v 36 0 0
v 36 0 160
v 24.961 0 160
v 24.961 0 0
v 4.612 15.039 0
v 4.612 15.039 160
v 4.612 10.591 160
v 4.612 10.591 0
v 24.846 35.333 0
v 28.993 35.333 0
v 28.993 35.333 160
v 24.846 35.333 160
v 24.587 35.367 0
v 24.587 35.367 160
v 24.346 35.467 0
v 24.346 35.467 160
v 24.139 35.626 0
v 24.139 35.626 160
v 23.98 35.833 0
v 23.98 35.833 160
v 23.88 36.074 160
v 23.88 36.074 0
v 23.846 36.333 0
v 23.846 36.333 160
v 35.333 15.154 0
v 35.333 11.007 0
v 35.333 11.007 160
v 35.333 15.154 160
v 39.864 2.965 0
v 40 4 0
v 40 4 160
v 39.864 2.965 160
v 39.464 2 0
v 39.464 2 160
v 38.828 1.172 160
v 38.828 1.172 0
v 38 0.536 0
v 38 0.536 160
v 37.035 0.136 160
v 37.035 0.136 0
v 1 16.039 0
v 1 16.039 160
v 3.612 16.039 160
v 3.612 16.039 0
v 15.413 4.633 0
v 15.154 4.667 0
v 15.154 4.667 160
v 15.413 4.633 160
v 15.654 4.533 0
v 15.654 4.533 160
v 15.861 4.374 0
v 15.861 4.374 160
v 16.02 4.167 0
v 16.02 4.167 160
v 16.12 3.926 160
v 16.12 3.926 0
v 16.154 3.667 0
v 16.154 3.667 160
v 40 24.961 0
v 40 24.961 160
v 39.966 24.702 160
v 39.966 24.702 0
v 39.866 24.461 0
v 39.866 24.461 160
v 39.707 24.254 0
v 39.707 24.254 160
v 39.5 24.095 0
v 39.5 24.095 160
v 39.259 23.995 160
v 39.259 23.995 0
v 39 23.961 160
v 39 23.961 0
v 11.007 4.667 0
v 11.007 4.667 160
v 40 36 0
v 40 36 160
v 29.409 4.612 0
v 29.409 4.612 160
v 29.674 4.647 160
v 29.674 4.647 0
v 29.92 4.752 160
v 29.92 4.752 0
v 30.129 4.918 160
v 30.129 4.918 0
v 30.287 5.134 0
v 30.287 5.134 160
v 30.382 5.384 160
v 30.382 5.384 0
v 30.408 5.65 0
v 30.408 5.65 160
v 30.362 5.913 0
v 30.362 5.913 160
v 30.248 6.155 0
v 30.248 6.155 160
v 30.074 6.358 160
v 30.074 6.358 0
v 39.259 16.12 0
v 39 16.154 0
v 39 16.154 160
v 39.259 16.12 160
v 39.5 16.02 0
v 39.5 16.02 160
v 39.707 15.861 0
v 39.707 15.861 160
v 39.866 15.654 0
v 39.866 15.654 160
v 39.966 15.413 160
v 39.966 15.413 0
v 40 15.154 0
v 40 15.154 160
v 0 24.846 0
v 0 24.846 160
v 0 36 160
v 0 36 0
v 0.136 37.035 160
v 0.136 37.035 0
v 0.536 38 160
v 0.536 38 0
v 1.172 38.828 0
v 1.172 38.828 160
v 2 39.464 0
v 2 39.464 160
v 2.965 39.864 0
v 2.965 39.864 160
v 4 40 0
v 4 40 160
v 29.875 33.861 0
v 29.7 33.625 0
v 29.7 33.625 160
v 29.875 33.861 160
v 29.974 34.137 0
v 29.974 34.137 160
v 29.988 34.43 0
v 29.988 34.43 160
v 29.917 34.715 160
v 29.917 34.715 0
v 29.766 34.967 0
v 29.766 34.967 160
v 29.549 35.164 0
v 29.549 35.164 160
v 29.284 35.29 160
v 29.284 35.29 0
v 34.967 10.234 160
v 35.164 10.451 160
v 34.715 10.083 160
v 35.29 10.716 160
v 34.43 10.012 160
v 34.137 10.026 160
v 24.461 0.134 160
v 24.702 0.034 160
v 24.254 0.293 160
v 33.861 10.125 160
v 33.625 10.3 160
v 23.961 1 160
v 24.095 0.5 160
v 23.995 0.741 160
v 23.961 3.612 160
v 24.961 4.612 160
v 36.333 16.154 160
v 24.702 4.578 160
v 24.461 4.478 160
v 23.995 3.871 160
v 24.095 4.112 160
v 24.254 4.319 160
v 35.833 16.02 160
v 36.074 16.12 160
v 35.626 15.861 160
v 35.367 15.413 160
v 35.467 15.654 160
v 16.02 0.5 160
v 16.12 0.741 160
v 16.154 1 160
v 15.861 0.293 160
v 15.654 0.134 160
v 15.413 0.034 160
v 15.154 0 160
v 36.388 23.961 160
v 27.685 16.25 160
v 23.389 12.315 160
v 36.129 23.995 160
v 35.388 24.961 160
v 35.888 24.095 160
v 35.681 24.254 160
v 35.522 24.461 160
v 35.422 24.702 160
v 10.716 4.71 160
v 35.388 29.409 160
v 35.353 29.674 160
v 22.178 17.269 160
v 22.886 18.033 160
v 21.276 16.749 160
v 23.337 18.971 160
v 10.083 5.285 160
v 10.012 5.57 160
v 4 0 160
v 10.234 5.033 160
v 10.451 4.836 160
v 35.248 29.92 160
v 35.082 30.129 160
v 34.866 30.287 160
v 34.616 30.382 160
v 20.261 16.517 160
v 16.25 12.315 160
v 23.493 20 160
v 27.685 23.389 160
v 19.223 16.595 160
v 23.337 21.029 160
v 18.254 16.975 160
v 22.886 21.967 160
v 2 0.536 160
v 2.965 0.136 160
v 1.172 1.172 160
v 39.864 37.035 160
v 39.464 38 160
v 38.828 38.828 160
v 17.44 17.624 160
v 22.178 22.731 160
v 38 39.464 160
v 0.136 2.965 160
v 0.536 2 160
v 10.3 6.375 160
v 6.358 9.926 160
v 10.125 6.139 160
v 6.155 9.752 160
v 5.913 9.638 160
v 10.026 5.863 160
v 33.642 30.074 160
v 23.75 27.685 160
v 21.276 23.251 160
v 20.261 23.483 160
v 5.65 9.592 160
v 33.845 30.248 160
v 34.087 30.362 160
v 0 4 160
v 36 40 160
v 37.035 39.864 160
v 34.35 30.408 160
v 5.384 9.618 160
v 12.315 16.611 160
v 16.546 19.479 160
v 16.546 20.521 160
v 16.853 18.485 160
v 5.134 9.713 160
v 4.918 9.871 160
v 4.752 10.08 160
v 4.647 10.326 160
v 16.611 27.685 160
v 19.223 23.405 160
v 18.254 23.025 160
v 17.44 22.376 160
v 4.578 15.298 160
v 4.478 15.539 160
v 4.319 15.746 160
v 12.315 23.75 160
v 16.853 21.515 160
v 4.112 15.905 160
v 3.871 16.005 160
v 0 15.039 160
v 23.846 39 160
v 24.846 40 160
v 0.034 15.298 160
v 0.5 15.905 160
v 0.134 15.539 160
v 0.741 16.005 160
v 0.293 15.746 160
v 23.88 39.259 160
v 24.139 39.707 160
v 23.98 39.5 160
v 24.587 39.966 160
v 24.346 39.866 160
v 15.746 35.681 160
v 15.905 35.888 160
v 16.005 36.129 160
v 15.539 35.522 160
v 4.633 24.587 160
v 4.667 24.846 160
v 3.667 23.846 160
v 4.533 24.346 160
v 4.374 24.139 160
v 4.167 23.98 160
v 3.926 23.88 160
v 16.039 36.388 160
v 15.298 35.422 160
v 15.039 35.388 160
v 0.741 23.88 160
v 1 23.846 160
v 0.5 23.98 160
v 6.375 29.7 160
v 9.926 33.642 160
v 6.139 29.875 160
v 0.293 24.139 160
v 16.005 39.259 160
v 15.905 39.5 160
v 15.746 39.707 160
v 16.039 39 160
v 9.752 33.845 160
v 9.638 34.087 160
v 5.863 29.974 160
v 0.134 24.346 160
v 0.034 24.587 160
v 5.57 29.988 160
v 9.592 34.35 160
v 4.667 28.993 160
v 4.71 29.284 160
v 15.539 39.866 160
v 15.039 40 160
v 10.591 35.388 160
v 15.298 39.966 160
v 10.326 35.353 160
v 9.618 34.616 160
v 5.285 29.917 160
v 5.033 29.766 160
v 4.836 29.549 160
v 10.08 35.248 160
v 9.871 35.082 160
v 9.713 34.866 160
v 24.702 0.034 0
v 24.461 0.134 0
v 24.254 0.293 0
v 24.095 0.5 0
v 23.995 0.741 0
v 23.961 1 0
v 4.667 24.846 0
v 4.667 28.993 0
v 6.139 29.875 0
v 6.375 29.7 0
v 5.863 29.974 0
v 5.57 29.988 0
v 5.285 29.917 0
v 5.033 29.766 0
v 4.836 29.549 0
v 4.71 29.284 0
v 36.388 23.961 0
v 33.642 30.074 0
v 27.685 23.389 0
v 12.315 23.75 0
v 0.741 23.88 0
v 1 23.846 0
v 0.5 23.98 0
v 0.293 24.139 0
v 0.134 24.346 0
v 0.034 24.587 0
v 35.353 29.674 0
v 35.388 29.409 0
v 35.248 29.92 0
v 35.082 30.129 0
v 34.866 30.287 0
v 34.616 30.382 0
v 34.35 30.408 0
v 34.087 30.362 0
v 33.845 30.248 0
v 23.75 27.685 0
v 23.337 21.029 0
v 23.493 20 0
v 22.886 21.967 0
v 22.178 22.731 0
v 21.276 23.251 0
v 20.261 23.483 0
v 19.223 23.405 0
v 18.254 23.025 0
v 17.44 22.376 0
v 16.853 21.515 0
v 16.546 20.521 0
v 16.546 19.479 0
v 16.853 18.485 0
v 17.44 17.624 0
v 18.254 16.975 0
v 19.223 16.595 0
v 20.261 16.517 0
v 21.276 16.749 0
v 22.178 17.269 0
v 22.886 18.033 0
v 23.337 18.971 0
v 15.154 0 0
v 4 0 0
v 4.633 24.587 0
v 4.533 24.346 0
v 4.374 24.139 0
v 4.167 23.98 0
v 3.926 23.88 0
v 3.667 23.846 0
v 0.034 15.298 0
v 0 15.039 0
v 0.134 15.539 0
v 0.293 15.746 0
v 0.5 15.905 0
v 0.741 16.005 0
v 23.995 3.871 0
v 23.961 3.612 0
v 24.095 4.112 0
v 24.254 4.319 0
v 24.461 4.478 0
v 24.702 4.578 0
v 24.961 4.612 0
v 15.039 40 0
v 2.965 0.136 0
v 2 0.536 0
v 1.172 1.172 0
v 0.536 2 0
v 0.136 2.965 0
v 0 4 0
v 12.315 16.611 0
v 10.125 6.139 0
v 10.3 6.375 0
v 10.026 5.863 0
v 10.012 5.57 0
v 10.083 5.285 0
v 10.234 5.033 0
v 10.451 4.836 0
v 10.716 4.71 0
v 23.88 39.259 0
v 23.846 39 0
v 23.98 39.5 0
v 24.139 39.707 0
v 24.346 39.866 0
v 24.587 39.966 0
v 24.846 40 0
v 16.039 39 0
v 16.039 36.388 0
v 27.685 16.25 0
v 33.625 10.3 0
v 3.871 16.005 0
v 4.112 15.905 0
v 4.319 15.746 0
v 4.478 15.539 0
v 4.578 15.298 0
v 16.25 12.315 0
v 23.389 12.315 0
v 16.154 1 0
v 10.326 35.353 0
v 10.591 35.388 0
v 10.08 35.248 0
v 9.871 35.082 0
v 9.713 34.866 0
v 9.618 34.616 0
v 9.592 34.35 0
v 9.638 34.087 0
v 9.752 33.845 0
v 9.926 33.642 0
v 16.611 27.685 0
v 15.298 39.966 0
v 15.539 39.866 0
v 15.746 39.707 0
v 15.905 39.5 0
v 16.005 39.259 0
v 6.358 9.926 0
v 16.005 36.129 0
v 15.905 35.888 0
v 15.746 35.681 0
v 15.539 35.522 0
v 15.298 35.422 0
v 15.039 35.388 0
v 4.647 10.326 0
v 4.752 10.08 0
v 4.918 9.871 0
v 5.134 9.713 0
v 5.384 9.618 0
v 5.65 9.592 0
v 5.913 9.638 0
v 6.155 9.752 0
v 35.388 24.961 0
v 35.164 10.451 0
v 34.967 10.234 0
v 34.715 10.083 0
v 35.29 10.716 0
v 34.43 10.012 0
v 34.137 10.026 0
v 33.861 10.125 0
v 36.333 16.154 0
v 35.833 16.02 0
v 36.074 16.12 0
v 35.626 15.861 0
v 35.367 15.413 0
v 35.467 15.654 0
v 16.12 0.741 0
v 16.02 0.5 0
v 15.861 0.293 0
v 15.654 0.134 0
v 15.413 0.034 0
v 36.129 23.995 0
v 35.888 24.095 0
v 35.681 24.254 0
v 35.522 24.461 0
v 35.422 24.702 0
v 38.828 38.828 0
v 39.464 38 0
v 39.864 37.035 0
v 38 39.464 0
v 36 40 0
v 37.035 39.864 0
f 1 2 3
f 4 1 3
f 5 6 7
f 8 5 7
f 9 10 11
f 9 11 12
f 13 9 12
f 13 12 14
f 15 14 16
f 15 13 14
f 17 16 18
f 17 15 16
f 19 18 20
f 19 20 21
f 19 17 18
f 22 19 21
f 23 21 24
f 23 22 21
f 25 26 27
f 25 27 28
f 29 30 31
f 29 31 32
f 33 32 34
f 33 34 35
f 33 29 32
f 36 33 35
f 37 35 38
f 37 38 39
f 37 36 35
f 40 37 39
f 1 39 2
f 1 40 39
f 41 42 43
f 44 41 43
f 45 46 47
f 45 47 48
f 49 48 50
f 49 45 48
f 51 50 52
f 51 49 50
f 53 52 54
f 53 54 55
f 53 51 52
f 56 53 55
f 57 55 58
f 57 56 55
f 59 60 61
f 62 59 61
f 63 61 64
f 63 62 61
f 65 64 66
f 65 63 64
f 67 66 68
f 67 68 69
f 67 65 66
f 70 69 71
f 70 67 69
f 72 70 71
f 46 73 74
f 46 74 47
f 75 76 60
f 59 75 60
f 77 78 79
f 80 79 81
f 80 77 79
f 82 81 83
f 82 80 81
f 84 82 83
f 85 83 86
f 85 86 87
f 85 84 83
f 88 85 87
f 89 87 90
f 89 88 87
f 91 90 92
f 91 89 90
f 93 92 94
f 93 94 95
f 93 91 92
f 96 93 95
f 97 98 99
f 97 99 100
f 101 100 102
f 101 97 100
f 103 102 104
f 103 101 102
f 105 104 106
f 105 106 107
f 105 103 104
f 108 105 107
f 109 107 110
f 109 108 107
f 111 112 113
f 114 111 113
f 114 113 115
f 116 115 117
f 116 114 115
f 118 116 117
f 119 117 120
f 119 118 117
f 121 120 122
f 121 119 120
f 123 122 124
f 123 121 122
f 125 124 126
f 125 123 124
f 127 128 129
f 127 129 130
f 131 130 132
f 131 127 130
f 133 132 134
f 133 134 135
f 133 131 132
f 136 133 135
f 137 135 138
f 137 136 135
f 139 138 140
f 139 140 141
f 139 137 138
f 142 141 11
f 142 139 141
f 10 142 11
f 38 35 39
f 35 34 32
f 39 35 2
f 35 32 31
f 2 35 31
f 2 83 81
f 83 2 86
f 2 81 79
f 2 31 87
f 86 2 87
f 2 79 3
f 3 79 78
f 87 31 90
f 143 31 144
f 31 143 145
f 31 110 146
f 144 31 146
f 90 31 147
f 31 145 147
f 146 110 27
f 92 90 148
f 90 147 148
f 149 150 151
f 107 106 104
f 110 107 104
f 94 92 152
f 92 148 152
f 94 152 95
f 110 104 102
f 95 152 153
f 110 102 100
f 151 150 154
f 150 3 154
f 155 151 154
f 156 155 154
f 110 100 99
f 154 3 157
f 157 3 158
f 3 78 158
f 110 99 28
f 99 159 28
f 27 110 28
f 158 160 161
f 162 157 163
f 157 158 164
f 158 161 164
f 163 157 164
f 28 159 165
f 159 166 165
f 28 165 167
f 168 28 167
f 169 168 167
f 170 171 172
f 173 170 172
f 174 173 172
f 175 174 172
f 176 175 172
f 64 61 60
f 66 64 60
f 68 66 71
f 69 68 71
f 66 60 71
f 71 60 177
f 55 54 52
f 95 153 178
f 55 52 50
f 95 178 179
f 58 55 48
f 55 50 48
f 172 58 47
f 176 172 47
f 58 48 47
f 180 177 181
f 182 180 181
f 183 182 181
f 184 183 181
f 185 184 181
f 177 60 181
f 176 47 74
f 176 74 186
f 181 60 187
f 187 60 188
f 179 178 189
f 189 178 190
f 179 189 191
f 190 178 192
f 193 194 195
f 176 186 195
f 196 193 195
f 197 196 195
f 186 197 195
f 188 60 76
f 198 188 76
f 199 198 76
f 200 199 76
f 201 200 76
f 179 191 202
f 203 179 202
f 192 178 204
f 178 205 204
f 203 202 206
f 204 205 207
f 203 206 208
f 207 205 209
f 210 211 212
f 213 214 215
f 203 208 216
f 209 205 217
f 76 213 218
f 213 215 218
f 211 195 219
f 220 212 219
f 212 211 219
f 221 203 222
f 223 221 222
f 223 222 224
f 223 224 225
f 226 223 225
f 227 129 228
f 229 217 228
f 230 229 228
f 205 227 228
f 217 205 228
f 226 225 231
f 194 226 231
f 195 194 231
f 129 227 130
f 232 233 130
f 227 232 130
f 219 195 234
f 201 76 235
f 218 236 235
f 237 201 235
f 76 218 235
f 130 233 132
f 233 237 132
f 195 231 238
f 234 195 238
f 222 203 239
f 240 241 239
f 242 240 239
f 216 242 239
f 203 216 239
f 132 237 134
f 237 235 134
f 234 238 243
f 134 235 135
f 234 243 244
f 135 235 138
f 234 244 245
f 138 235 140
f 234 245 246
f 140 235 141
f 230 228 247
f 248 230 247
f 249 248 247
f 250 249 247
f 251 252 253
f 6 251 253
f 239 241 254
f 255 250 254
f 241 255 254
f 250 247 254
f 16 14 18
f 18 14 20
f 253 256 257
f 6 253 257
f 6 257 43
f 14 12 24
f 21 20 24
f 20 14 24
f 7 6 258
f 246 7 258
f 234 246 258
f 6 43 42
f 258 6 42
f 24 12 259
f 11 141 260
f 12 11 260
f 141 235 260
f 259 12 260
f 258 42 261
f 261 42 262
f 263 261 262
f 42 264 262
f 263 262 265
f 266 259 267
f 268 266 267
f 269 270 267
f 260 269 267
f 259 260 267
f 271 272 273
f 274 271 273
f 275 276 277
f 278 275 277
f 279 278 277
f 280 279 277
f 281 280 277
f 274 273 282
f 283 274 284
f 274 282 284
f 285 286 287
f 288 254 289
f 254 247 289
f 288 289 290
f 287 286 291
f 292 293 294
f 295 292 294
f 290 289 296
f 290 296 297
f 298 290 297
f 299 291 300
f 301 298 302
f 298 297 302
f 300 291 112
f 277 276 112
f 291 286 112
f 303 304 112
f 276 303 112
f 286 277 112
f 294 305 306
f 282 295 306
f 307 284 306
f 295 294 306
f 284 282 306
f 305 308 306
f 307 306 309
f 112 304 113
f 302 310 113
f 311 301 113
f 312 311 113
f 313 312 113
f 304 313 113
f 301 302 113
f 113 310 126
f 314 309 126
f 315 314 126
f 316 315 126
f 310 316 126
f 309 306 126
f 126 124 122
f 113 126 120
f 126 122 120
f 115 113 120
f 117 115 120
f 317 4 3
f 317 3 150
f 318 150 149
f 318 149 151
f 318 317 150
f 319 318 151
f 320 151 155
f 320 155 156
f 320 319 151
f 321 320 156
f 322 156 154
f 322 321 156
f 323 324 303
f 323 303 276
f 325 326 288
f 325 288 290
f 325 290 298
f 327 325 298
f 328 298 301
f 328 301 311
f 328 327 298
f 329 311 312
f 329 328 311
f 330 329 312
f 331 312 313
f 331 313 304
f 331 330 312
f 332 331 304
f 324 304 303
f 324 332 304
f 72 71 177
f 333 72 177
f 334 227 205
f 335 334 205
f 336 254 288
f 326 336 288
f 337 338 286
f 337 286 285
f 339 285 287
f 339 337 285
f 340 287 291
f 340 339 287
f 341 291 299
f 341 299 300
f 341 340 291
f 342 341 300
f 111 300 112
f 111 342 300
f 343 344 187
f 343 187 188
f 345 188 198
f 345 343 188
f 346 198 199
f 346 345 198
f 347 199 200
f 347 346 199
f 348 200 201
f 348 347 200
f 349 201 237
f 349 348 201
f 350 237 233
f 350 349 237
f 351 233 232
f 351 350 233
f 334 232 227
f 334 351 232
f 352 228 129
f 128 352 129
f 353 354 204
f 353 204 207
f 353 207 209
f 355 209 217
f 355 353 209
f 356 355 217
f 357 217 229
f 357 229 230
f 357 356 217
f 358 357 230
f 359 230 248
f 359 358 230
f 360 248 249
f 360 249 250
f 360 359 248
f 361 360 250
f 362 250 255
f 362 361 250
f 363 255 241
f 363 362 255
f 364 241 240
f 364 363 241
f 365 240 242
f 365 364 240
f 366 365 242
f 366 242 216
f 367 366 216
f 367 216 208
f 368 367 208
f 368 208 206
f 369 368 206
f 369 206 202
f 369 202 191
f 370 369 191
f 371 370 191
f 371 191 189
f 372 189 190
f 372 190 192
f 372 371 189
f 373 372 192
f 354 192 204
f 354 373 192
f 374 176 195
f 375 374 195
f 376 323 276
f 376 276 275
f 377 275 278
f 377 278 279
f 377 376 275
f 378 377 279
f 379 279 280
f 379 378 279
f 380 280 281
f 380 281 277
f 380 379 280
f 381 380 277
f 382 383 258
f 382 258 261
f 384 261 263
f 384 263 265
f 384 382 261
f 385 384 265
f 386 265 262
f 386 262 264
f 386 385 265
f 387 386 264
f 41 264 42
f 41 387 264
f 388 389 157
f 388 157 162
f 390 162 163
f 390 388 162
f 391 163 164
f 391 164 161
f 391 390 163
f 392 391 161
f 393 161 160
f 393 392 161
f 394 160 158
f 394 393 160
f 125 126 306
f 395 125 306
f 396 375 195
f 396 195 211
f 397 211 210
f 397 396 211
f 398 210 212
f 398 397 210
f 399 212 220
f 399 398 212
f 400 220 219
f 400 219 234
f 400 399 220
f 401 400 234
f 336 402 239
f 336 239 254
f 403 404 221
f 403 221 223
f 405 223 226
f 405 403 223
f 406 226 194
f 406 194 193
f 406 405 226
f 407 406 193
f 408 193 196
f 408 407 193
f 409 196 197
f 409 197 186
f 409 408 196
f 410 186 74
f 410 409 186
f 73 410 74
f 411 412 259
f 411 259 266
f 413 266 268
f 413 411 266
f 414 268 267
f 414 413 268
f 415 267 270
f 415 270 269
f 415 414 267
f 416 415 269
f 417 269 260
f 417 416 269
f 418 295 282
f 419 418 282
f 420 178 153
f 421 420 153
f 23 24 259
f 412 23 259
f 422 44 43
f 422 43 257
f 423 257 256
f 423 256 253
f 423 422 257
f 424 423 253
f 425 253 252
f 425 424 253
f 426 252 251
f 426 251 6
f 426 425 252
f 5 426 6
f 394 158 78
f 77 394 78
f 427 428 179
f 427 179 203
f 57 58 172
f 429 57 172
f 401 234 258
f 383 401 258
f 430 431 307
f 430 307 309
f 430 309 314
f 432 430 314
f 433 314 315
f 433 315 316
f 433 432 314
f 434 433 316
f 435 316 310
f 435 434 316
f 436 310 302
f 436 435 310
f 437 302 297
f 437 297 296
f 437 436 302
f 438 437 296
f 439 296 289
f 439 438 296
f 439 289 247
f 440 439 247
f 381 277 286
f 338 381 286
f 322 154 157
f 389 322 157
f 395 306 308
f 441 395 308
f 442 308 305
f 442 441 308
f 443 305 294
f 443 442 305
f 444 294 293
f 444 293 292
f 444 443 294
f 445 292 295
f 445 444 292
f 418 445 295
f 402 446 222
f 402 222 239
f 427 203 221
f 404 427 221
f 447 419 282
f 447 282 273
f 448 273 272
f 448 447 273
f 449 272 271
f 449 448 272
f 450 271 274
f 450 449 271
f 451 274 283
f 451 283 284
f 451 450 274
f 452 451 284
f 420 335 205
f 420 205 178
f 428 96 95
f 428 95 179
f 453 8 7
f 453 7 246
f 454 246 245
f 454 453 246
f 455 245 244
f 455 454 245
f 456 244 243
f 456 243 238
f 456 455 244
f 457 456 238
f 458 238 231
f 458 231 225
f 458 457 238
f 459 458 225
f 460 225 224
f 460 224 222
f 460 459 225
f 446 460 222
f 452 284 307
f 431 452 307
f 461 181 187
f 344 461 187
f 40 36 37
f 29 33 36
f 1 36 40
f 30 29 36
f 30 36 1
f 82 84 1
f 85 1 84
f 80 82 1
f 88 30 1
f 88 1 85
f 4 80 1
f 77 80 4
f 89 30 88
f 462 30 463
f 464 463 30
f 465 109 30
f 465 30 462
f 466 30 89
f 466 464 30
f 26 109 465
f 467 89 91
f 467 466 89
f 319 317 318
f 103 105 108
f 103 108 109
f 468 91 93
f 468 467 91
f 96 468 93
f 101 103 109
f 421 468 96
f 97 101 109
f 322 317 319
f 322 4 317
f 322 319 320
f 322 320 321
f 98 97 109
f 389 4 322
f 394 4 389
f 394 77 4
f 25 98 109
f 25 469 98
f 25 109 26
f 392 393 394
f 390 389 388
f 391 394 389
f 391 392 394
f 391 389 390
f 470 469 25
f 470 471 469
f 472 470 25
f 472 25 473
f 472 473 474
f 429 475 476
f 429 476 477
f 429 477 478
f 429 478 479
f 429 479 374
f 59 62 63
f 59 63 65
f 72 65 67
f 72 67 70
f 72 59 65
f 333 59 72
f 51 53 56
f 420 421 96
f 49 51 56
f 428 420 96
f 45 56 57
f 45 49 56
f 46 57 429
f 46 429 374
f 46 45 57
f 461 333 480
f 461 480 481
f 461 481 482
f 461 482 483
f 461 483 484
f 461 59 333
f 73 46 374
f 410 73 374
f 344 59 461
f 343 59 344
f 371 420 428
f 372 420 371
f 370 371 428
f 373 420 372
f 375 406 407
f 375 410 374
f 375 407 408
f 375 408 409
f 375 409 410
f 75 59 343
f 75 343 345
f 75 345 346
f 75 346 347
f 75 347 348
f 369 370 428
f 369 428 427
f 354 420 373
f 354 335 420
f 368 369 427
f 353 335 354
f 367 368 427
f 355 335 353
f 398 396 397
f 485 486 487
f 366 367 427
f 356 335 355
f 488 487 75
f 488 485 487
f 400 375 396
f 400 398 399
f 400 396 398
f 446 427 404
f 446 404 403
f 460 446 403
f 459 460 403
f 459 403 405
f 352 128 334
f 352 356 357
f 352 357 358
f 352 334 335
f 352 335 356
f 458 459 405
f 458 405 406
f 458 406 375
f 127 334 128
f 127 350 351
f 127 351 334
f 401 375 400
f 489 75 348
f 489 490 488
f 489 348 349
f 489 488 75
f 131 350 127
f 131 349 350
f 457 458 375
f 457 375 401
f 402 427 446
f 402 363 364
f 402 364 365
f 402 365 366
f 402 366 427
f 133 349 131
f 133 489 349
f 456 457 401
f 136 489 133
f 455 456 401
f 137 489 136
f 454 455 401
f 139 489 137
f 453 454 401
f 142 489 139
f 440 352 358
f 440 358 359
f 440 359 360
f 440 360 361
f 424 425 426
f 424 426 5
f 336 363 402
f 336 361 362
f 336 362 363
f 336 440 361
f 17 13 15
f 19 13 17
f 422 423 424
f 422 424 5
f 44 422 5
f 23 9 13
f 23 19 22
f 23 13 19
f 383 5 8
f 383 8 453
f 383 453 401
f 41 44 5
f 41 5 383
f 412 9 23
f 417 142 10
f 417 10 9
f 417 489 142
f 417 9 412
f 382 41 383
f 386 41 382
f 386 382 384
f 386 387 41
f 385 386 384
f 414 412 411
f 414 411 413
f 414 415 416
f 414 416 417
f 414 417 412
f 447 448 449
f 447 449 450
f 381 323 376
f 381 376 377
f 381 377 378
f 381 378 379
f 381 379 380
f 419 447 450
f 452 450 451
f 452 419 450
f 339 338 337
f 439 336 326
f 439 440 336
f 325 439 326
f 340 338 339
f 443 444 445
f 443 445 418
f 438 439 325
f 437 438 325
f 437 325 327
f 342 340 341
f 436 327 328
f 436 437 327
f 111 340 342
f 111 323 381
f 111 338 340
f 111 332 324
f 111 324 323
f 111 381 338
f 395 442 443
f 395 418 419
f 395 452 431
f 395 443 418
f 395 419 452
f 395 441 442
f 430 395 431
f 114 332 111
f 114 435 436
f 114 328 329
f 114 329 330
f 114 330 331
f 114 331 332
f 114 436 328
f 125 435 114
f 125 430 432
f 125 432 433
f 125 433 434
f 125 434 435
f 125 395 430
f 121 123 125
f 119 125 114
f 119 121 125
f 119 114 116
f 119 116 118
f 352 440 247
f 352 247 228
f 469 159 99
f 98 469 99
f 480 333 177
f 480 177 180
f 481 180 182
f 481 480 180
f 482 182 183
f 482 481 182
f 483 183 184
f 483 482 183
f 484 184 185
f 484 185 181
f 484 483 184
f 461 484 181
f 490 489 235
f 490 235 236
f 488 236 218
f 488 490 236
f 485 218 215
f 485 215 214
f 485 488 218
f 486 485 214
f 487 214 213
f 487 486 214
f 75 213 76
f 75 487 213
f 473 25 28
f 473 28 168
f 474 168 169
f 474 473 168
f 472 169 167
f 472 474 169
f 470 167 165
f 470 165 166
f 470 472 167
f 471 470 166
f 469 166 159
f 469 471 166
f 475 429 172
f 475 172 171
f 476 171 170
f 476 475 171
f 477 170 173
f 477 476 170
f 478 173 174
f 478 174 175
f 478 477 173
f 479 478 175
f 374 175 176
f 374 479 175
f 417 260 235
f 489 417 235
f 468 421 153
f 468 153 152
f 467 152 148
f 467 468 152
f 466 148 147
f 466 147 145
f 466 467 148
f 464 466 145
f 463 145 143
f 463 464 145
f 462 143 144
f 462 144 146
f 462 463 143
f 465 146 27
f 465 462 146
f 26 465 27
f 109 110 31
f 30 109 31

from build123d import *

# Parameters (mm, degrees)
SKETCH2_R           = 3.492543695
BOSS_EXTRUDE1_DEPTH = 160


with BuildPart() as part:
    # Sketch2 → Boss-Extrude1 (new body)
    with BuildSketch(Plane.XY):
        with BuildLine():
            Line((19.48831917, 27.684671829), (23.749889801, 27.684671829))
            Line((23.749889801, 27.684671829), (29.699681879, 33.624984685))
            ThreePointArc((29.699681879, 33.624984685), (29.917171057, 34.714970099), (28.993139054, 35.332654972))
            Line((28.993139054, 35.332654972), (24.845630957, 35.332654972))
            ThreePointArc((24.845630957, 35.332654972), (24.138524175, 35.625548191), (23.845630957, 36.332654972))
            Line((23.845630957, 36.332654972), (23.845630957, 39))
            ThreePointArc((23.845630957, 39), (24.138524175, 39.707106781), (24.845630957, 40))
            Line((24.845630957, 40), (36, 40))
            ThreePointArc((36, 40), (38.828427125, 38.828427125), (40, 36))
            Line((40, 36), (40, 24.961087436))
            ThreePointArc((40, 24.961087436), (39.707106781, 24.253980655), (39, 23.961087436))
            Line((39, 23.961087436), (36.388269628, 23.961087436))
            ThreePointArc((36.388269628, 23.961087436), (35.681162846, 24.253980655), (35.388269628, 24.961087436))
            Line((35.388269628, 24.961087436), (35.388269628, 29.408620307))
            ThreePointArc((35.388269628, 29.408620307), (34.744223919, 30.343123673), (33.641676542, 30.073901274))
            Line((33.641676542, 30.073901274), (27.684671829, 23.388818206))
            Line((27.684671829, 23.388818206), (27.684671829, 20.51168083))
            Line((27.684671829, 20.51168083), (27.684671829, 16.250110199))
            Line((27.684671829, 16.250110199), (33.624984685, 10.300318121))
            ThreePointArc((33.624984685, 10.300318121), (34.714970099, 10.082828943), (35.332654972, 11.006860946))
            Line((35.332654972, 11.006860946), (35.332654972, 15.154369043))
            ThreePointArc((35.332654972, 15.154369043), (35.625548191, 15.861475825), (36.332654972, 16.154369043))
            Line((36.332654972, 16.154369043), (39, 16.154369043))
            ThreePointArc((39, 16.154369043), (39.707106781, 15.861475825), (40, 15.154369043))
            Line((40, 15.154369043), (40, 4))
            ThreePointArc((40, 4), (38.828427125, 1.171572875), (36, 0))
            Line((36, 0), (24.961087436, 0))
            ThreePointArc((24.961087436, 0), (24.253980655, 0.292893219), (23.961087436, 1))
            Line((23.961087436, 1), (23.961087436, 3.611730372))
            ThreePointArc((23.961087436, 3.611730372), (24.253980655, 4.318837154), (24.961087436, 4.611730372))
            Line((24.961087436, 4.611730372), (29.408620307, 4.611730372))
            ThreePointArc((29.408620307, 4.611730372), (30.343123673, 5.255776081), (30.073901274, 6.358323458))
            Line((30.073901274, 6.358323458), (23.388818206, 12.315328171))
            Line((23.388818206, 12.315328171), (20.51168083, 12.315328171))
            Line((20.51168083, 12.315328171), (16.250110199, 12.315328171))
            Line((16.250110199, 12.315328171), (10.300318121, 6.375015315))
            ThreePointArc((10.300318121, 6.375015315), (10.082828943, 5.285029901), (11.006860946, 4.667345028))
            Line((11.006860946, 4.667345028), (15.154369043, 4.667345028))
            ThreePointArc((15.154369043, 4.667345028), (15.861475825, 4.374451809), (16.154369043, 3.667345028))
            Line((16.154369043, 3.667345028), (16.154369043, 1))
            ThreePointArc((16.154369043, 1), (15.861475825, 0.292893219), (15.154369043, 0))
            Line((15.154369043, 0), (4, 0))
            ThreePointArc((4, 0), (1.171572875, 1.171572875), (0, 4))
            Line((0, 4), (0, 15.038912564))
            ThreePointArc((0, 15.038912564), (0.292893219, 15.746019345), (1, 16.038912564))
            Line((1, 16.038912564), (3.611730372, 16.038912564))
            ThreePointArc((3.611730372, 16.038912564), (4.318837154, 15.746019345), (4.611730372, 15.038912564))
            Line((4.611730372, 15.038912564), (4.611730372, 10.591379693))
            ThreePointArc((4.611730372, 10.591379693), (5.255776081, 9.656876327), (6.358323458, 9.926098726))
            Line((6.358323458, 9.926098726), (12.315328171, 16.611181794))
            Line((12.315328171, 16.611181794), (12.315328171, 19.48831917))
            Line((12.315328171, 19.48831917), (12.315328171, 23.749889801))
            Line((12.315328171, 23.749889801), (6.375015315, 29.699681879))
            ThreePointArc((6.375015315, 29.699681879), (5.285029901, 29.917171057), (4.667345028, 28.993139054))
            Line((4.667345028, 28.993139054), (4.667345028, 24.845630957))
            ThreePointArc((4.667345028, 24.845630957), (4.374451809, 24.138524175), (3.667345028, 23.845630957))
            Line((3.667345028, 23.845630957), (1, 23.845630957))
            ThreePointArc((1, 23.845630957), (0.292893219, 24.138524175), (0, 24.845630957))
            Line((0, 24.845630957), (0, 36))
            ThreePointArc((0, 36), (1.171572875, 38.828427125), (4, 40))
            Line((4, 40), (15.038912564, 40))
            ThreePointArc((15.038912564, 40), (15.746019345, 39.707106781), (16.038912564, 39))
            Line((16.038912564, 39), (16.038912564, 36.388269628))
            ThreePointArc((16.038912564, 36.388269628), (15.746019345, 35.681162846), (15.038912564, 35.388269628))
            Line((15.038912564, 35.388269628), (10.591379693, 35.388269628))
            ThreePointArc((10.591379693, 35.388269628), (9.656876327, 34.744223919), (9.926098726, 33.641676542))
            Line((9.926098726, 33.641676542), (16.611181794, 27.684671829))
            Line((16.611181794, 27.684671829), (19.48831917, 27.684671829))
        make_face()
        with Locations((20, 20)):
            Circle(SKETCH2_R, mode=Mode.SUBTRACT)
    extrude(amount=BOSS_EXTRUDE1_DEPTH)


solid = part.part
